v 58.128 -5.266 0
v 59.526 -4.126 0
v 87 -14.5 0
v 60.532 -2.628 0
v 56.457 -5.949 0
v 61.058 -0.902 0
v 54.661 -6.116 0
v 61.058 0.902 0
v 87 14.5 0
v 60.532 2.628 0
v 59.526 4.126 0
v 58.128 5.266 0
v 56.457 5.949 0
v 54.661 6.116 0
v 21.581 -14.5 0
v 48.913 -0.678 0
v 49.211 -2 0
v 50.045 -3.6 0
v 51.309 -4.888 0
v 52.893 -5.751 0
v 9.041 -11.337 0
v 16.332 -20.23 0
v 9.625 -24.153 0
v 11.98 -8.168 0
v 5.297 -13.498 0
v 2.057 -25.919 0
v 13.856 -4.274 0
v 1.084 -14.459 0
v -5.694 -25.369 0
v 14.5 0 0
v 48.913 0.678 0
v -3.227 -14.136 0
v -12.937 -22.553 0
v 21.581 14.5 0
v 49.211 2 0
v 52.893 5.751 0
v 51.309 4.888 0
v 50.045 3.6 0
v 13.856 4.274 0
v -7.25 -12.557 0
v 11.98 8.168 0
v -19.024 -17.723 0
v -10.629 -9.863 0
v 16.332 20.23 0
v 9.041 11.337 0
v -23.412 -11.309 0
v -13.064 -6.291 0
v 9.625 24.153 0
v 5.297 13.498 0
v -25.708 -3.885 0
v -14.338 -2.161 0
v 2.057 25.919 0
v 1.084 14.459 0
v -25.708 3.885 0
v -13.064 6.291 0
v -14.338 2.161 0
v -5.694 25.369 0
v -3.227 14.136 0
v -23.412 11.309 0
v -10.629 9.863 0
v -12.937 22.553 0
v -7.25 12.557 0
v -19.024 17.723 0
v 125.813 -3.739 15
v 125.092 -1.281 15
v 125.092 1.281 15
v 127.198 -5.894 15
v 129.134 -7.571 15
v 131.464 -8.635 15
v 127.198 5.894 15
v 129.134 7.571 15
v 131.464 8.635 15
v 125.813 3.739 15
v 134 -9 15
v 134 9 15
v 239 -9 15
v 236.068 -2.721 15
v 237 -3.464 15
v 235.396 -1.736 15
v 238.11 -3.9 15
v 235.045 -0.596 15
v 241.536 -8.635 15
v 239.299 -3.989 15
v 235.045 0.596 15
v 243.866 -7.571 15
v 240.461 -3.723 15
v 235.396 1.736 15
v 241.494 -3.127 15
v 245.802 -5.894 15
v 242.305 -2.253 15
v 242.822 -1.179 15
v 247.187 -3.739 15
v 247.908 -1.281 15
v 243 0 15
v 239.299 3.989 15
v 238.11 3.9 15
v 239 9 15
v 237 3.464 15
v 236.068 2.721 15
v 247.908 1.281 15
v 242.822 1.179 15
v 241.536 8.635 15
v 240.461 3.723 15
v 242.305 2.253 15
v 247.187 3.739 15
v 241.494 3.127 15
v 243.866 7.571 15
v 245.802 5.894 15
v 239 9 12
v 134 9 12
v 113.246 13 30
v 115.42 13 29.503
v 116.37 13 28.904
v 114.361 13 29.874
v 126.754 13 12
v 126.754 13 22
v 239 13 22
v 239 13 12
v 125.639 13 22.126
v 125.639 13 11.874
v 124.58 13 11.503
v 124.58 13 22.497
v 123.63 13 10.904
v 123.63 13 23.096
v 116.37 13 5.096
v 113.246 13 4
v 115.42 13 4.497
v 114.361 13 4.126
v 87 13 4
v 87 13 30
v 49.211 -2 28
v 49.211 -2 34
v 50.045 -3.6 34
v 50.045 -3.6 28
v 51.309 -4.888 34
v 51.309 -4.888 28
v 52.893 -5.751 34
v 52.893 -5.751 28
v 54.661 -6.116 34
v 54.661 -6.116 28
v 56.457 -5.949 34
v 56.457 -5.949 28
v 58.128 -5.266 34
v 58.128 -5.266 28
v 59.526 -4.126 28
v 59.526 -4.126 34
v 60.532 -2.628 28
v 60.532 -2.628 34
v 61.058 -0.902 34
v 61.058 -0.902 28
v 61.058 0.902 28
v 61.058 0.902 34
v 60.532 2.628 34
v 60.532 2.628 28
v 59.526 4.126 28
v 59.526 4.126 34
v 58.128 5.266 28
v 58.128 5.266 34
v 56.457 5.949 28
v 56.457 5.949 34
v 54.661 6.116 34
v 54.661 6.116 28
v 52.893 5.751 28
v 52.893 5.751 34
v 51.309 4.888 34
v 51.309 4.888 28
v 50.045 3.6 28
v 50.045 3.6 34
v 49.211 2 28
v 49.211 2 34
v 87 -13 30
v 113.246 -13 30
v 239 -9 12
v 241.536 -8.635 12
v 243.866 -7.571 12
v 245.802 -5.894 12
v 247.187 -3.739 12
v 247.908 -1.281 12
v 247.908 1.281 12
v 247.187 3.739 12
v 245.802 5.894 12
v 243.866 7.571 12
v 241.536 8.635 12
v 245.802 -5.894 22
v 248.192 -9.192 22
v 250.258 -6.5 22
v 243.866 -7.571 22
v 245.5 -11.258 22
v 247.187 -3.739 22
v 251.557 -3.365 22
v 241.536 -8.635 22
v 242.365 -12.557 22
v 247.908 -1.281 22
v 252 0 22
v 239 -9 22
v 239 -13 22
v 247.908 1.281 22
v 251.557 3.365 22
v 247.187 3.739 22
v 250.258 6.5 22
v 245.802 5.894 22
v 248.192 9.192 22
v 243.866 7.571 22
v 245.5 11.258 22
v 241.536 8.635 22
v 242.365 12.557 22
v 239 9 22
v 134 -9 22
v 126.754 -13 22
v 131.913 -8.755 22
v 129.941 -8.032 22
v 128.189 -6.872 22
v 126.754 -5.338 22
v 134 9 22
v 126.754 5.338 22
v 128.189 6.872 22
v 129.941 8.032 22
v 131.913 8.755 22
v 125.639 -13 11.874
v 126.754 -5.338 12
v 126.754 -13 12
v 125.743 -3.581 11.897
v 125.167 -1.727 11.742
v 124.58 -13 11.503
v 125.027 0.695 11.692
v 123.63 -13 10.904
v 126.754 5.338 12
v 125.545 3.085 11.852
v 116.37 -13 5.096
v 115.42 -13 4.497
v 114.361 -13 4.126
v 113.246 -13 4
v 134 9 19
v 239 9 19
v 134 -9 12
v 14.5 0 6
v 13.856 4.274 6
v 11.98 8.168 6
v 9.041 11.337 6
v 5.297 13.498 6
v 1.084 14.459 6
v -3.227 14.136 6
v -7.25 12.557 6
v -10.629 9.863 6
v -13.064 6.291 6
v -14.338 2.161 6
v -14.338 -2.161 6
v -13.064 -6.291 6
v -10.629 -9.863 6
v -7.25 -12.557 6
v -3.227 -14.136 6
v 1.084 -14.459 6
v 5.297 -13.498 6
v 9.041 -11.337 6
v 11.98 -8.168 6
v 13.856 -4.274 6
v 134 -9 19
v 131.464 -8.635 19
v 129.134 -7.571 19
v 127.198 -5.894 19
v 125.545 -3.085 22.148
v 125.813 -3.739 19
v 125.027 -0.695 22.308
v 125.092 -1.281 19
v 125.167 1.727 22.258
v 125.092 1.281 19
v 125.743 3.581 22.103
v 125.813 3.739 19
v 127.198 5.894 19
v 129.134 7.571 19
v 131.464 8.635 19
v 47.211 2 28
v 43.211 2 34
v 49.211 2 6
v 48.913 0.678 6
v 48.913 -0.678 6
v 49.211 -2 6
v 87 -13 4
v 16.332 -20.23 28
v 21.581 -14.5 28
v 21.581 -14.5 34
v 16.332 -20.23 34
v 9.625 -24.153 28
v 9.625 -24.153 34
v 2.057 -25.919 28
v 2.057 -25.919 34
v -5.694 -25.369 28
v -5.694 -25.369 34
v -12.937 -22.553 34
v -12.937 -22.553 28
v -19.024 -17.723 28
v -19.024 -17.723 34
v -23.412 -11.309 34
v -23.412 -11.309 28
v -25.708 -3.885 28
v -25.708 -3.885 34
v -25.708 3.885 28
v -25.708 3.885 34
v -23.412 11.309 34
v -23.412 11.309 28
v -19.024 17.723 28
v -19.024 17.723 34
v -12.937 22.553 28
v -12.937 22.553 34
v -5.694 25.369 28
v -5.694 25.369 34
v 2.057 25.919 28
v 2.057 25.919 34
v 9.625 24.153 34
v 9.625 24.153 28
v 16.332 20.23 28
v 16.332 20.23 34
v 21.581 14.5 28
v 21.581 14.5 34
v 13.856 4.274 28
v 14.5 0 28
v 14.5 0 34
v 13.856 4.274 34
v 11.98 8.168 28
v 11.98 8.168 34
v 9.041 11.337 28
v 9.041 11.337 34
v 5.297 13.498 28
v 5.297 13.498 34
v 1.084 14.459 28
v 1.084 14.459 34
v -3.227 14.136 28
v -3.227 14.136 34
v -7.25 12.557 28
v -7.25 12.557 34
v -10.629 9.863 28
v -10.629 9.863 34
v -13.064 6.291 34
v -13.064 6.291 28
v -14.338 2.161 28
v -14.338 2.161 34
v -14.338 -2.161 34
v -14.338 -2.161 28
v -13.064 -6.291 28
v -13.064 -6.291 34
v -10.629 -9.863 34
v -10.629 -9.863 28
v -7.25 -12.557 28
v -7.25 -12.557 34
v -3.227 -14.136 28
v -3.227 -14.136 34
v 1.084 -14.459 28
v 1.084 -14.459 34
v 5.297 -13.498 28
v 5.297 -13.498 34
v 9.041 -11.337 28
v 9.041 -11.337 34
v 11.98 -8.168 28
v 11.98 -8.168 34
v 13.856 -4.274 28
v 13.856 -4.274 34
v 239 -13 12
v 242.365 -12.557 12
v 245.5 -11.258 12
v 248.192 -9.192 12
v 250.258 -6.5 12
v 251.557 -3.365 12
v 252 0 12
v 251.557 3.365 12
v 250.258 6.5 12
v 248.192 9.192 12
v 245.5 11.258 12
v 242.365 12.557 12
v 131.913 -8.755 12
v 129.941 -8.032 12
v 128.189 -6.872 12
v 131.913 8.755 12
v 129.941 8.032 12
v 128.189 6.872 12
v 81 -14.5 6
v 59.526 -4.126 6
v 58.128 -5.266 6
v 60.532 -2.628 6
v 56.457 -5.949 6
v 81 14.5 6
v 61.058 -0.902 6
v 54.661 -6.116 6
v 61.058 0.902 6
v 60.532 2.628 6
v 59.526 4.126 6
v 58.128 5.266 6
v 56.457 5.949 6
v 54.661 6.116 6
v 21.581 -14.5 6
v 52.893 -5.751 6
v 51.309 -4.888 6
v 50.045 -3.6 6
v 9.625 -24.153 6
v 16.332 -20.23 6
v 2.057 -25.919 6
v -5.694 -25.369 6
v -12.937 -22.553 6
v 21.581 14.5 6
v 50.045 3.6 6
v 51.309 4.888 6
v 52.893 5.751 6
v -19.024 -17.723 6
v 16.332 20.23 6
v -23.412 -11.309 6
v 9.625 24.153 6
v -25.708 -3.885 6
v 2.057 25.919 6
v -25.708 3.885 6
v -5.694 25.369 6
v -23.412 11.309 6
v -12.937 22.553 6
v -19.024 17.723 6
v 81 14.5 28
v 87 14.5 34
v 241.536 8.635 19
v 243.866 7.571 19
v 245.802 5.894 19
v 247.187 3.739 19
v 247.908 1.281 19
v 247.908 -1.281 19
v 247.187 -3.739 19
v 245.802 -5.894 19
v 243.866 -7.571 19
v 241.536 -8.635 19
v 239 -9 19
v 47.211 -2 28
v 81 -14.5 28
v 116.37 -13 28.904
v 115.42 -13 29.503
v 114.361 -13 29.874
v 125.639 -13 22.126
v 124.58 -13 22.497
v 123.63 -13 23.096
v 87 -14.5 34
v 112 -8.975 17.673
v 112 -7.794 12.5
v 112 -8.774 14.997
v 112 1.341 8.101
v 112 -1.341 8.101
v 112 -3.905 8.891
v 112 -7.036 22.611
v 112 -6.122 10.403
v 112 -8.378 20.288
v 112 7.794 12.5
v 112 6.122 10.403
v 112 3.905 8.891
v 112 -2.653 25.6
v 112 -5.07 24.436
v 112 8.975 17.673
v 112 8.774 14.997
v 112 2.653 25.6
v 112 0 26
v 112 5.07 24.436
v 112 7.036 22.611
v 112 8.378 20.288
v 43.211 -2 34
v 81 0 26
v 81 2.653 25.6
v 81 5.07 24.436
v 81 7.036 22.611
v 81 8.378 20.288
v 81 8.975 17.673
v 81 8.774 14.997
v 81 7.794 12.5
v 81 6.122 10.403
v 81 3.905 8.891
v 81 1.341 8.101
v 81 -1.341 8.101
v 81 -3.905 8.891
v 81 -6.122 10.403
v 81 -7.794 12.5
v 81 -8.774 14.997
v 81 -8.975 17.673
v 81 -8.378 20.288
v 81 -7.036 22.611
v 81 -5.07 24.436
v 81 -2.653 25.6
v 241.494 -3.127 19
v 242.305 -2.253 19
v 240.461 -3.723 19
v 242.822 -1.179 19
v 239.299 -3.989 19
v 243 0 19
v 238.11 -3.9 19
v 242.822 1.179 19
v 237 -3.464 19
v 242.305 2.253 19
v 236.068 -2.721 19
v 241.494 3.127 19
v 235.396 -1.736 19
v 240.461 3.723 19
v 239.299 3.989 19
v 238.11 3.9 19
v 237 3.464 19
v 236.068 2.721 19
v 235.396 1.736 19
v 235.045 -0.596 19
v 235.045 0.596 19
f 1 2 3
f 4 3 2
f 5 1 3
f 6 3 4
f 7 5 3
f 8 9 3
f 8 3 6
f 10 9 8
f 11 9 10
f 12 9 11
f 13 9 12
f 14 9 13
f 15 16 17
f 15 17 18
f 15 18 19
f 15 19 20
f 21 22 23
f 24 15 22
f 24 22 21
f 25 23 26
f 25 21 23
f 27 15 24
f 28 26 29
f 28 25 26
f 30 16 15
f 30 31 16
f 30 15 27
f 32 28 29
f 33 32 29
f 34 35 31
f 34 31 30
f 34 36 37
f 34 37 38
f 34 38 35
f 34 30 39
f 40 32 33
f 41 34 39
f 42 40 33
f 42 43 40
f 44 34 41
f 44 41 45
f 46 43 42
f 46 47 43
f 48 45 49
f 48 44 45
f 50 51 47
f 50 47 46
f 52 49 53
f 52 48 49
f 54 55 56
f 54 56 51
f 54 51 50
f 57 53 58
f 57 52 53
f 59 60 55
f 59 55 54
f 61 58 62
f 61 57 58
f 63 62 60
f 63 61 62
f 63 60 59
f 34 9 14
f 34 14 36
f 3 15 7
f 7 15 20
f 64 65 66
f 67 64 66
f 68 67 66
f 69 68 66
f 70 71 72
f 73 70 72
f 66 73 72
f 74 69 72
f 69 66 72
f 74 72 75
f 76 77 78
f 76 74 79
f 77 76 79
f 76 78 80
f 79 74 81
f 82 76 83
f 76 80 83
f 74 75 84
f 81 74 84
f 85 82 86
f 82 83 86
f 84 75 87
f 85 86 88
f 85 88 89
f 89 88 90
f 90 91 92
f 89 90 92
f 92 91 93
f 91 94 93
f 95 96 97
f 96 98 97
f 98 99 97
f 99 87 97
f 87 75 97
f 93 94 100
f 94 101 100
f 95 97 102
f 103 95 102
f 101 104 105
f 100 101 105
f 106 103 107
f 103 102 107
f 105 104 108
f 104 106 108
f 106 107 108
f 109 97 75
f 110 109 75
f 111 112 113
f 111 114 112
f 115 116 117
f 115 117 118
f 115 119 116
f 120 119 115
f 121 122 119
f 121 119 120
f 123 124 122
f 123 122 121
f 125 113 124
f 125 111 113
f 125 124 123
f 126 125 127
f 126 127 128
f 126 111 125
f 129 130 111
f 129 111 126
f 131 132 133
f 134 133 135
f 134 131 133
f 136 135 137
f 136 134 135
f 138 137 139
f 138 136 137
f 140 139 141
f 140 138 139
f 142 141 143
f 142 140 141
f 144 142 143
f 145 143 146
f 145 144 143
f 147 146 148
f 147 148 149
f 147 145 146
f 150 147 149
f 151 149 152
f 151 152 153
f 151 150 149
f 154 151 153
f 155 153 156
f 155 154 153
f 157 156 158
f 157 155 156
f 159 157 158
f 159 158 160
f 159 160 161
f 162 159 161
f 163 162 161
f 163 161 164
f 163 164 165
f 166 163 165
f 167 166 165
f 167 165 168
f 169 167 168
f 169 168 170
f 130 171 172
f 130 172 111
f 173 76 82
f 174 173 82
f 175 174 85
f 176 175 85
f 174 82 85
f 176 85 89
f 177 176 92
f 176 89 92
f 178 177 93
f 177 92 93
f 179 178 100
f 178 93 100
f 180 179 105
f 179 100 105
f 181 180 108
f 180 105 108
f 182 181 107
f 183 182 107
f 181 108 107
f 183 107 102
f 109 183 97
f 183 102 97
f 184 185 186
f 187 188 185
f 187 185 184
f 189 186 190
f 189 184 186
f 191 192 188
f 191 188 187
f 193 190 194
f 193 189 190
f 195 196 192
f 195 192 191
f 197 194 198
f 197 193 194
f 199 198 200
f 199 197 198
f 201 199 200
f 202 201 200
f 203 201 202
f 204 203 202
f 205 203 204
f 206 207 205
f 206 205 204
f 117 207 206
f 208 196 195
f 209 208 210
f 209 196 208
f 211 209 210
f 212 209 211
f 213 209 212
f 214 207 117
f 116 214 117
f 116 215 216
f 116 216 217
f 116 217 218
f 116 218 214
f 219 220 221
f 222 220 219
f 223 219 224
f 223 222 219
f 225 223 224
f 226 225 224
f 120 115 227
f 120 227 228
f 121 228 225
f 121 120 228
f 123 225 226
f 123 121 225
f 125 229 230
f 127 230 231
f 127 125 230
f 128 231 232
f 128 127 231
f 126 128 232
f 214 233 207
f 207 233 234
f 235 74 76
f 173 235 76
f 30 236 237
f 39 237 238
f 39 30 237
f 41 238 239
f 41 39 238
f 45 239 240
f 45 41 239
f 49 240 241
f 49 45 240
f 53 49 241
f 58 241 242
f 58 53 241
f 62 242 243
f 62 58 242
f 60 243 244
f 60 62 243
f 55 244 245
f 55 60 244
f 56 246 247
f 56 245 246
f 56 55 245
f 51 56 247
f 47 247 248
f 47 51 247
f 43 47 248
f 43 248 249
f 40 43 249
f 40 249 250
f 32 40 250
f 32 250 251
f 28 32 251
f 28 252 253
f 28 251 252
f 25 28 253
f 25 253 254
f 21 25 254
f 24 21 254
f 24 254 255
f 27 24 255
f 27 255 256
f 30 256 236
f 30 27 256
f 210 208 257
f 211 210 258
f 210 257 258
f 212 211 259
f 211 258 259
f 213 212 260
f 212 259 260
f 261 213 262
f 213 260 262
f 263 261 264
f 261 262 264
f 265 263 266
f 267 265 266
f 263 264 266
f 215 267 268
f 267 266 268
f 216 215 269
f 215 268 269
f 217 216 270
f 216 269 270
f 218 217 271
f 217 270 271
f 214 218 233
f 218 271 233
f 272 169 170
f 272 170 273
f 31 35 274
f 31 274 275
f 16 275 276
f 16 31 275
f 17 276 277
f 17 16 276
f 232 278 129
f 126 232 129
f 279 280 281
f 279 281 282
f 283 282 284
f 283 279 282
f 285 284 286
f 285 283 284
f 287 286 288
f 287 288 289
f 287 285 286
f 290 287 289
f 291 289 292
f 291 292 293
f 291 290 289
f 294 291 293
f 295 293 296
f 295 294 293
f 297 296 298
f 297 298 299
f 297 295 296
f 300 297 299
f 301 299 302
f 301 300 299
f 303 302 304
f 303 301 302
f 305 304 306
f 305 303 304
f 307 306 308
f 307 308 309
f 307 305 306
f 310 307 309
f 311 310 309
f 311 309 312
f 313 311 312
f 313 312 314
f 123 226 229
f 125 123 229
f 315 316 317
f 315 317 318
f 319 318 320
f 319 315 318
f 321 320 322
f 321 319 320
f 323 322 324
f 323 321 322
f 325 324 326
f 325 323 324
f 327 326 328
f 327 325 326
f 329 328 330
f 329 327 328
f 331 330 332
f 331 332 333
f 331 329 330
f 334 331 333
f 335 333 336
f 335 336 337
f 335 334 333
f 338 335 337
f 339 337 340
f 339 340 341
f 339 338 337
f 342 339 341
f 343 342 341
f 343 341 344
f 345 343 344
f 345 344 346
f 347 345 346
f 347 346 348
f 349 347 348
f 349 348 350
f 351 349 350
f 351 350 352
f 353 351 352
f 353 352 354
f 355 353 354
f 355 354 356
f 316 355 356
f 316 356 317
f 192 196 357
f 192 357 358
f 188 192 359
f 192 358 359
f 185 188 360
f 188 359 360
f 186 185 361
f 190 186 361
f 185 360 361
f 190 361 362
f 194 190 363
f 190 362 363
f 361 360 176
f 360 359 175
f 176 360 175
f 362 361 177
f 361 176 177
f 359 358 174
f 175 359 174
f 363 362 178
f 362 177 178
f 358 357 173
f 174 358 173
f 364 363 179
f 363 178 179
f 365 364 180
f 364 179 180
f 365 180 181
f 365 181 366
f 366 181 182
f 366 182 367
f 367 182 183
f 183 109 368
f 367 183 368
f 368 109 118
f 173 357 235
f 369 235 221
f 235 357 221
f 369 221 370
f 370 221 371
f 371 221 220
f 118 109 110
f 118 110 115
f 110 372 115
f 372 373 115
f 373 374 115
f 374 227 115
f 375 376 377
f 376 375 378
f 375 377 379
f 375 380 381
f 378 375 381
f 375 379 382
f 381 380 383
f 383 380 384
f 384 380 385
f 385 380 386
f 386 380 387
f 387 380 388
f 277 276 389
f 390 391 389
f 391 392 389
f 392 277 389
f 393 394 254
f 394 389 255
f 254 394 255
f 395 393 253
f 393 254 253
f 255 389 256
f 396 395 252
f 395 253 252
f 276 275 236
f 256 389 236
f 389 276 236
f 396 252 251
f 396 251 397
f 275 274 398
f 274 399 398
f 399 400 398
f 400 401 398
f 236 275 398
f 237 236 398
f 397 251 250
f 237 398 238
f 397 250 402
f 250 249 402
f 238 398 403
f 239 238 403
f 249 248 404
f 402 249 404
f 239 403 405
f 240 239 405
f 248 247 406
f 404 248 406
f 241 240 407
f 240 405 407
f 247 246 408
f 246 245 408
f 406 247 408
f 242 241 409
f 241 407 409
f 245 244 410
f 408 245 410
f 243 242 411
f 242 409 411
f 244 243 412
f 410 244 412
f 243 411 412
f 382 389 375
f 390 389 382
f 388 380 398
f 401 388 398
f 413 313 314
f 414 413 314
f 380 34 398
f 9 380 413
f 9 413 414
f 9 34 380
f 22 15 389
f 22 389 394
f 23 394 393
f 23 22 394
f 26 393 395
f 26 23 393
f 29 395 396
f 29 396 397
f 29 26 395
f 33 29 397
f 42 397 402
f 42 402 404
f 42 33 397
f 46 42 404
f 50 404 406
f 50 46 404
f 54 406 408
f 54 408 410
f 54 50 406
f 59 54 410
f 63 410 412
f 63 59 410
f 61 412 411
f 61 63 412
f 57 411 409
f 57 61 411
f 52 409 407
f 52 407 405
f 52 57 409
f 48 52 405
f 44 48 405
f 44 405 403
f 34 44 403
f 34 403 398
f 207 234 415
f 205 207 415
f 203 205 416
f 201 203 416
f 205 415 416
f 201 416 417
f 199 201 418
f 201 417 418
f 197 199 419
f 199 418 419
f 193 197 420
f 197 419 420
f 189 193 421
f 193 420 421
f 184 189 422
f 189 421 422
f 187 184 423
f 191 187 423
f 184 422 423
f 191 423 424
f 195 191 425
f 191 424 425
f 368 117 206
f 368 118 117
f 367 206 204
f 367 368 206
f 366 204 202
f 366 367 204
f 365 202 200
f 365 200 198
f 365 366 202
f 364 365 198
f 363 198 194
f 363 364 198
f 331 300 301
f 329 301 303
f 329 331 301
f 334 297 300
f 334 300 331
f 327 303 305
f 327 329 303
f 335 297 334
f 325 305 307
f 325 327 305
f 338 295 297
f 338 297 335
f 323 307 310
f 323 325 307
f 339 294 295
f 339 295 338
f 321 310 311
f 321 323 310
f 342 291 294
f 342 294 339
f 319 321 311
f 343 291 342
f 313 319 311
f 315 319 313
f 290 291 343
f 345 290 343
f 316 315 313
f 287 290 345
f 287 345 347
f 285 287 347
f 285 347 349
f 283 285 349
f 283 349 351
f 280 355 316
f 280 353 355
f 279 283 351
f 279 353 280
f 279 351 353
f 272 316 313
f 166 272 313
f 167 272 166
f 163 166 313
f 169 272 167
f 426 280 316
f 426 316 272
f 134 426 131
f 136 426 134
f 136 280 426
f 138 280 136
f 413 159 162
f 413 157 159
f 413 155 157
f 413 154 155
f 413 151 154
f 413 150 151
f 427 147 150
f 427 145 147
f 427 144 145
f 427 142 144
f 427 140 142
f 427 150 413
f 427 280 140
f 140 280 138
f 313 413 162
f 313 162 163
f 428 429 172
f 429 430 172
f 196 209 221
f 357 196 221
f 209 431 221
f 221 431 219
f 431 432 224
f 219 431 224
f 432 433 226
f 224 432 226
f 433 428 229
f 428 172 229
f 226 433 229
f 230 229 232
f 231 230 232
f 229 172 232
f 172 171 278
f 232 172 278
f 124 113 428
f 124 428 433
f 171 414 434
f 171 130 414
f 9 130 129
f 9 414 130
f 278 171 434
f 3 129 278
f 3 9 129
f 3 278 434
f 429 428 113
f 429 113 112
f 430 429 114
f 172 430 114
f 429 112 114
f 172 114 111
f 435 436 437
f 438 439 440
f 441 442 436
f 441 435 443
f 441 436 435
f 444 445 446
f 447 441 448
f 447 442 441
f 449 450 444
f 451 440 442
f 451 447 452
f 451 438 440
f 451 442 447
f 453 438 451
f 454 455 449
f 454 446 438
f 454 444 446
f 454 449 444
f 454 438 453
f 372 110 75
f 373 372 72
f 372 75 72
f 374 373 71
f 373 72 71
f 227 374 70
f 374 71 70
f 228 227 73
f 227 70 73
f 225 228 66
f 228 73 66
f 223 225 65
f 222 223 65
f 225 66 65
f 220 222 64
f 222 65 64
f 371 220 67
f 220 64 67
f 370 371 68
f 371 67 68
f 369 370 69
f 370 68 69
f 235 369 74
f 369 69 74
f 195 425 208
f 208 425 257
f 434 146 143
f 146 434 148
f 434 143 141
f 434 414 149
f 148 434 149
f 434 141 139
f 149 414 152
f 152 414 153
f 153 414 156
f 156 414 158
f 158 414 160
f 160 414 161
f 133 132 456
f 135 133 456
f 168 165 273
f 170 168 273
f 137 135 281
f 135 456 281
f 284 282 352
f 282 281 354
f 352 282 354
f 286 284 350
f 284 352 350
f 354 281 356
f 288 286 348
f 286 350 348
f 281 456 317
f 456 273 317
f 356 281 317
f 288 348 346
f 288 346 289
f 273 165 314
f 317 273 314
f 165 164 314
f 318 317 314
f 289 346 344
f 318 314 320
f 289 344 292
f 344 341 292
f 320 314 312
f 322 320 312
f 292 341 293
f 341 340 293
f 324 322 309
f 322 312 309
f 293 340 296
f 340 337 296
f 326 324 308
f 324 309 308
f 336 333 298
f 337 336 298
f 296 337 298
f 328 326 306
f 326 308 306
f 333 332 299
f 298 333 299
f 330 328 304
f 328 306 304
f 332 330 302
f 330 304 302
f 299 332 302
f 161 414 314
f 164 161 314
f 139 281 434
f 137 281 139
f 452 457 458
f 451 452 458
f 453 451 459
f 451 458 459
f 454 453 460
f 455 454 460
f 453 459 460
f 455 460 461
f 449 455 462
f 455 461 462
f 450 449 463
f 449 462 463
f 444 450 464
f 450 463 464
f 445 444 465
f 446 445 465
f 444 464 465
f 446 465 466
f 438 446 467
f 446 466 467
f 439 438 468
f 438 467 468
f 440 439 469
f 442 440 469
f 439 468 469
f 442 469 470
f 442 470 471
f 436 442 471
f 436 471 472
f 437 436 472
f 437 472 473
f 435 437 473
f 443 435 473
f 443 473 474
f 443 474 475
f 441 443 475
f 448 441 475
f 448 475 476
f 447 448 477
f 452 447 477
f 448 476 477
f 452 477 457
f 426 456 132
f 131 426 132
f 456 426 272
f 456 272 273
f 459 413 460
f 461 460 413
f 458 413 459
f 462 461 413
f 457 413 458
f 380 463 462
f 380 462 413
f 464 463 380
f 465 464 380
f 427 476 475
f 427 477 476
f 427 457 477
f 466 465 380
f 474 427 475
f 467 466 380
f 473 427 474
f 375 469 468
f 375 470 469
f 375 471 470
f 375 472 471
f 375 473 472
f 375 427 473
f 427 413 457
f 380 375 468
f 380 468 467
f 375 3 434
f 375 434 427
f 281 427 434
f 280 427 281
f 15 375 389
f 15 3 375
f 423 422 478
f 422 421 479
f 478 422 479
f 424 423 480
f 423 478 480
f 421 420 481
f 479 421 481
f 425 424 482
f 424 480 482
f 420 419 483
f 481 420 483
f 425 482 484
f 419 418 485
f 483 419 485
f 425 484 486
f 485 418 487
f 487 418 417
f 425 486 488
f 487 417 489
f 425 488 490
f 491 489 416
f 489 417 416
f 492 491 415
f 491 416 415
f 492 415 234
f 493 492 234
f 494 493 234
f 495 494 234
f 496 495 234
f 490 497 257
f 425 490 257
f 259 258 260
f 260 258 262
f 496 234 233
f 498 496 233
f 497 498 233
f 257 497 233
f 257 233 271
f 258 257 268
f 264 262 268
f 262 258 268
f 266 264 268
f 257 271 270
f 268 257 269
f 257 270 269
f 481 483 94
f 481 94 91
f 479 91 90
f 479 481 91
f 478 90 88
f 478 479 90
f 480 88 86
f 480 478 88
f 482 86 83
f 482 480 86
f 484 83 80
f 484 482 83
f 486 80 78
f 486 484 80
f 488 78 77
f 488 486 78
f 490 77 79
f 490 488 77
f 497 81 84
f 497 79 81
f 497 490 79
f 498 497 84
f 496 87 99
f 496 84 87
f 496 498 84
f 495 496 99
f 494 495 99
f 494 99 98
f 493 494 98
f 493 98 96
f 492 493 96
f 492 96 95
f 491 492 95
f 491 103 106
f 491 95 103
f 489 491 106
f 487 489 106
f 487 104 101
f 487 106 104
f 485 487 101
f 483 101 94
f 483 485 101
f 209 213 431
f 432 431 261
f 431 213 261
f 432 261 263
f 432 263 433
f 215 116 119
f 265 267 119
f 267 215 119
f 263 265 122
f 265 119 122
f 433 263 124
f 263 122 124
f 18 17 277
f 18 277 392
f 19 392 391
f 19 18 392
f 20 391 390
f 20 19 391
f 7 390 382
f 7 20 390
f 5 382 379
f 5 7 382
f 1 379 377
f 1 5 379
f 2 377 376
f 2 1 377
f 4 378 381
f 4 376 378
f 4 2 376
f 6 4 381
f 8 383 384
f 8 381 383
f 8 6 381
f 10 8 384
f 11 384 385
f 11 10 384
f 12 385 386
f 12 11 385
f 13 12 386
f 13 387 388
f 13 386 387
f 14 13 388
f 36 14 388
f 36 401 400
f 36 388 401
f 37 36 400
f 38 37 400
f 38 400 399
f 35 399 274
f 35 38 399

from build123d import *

# Parameters (mm, degrees)
ESBO_O1_R                  = 14.5
RESSALTO_EXTRUS_O1_DEPTH   = 34
CORTE_EXTRUS_O1_DEPTH      = 36
CORTE_EXTRUS_O1_DEPTH_BACK = 56
ESBO_O2_W                  = 115.279866195
ESBO_O2_H                  = 22
RESSALTO_EXTRUS_O2_DEPTH   = 4
RESSALTO_EXTRUS_O3_START   = -6
RESSALTO_EXTRUS_O3_DEPTH   = 6
ESBO_O5_W                  = 26
ESBO_O5_H                  = 26
RESSALTO_EXTRUS_O4_DEPTH   = 28
ESBO_O6_R                  = 9
CORTE_EXTRUS_O2_DEPTH      = 31
ESBO_O7_W                  = 10
ESBO_O7_H                  = 26
RESSALTO_EXTRUS_O5_DEPTH   = 10
RESSALTO_EXTRUS_O7_START   = -26
RESSALTO_EXTRUS_O7_DEPTH   = 26
FILETE1_R                  = 5
ESBO_O9_W                  = 10
ESBO_O9_H                  = 26
RESSALTO_EXTRUS_O8_DEPTH   = 127
FILETE2_R                  = 13
FILETE3_R                  = 5
CORTE_EXTRUS_O3_DEPTH      = 49
CORTE_EXTRUS_O3_DEPTH_BACK = 3
CORTE_EXTRUS_O4_DEPTH      = 52
CORTE_EXTRUS_O4_DEPTH_BACK = 3
CORTE_EXTRUS_O5_DEPTH      = 27
CORTE_EXTRUS_O5_DEPTH_BACK = 22
ESBO_O12_R                 = 4


with BuildPart() as part:
    # Esboço1 → Ressalto-extrusão1 (new body)
    with BuildSketch(Plane.XY):
        with BuildLine():
            Line((21.581241855, 14.5), (87, 14.5))
            Line((87, 14.5), (87, -14.5))
            Line((87, -14.5), (21.581241855, -14.5))
            ThreePointArc((21.581241855, -14.5), (-26, 0), (21.581241855, 14.5))
        make_face()
        Circle(ESBO_O1_R, mode=Mode.SUBTRACT)
        with BuildLine():
            ThreePointArc((49.210731912, -2), (61.125, 0), (49.210731912, 2))
            Line((49.210731912, 2), (43.210731912, 2))
            Line((43.210731912, 2), (43.210731912, -2))
            Line((43.210731912, -2), (49.210731912, -2))
        make_face(mode=Mode.SUBTRACT)
    extrude(amount=RESSALTO_EXTRUS_O1_DEPTH)

    # Esboço2 → Corte-extrusão1 (cut, two sides: drawn at the far end of the back side and taken through both)
    with BuildSketch(Plane(origin=(0, 14.5, 0), x_dir=(1, 0, 0), z_dir=(0, 1, 0)).offset(-CORTE_EXTRUS_O1_DEPTH_BACK)):
        with Locations((23.360066902, -17)):
            Rectangle(ESBO_O2_W, ESBO_O2_H)
    extrude(amount=CORTE_EXTRUS_O1_DEPTH + CORTE_EXTRUS_O1_DEPTH_BACK, mode=Mode.SUBTRACT)

    # Esboço3 → Ressalto-extrusão2 (add)
    with BuildSketch(Plane(origin=(0, -2, 0), x_dir=(1, 0, 0), z_dir=(0, 1, 0))):
        Polygon((43.210731912, -28), (47.210731912, -28), (43.210731912, -34), align=None)
    extrude(amount=RESSALTO_EXTRUS_O2_DEPTH)

    # Esboço4 → Ressalto-extrusão3 (add)
    with BuildSketch(Plane.XY.offset(6).offset(RESSALTO_EXTRUS_O3_START)):
        with BuildLine():
            ThreePointArc((49.210731912, 2), (48.875, 0), (49.210731912, -2))
            Line((49.210731912, -2), (43.210731912, -2))
            Line((43.210731912, -2), (43.210731912, 2))
            Line((43.210731912, 2), (49.210731912, 2))
        make_face()
    extrude(amount=RESSALTO_EXTRUS_O3_DEPTH)

    # Esboço5 → Ressalto-extrusão4 (add)
    with BuildSketch(Plane(origin=(87, 0, 0), x_dir=(0, 0, -1), z_dir=(1, 0, 0))):
        with Locations((-17, 0)):
            Rectangle(ESBO_O5_W, ESBO_O5_H)
    extrude(amount=RESSALTO_EXTRUS_O4_DEPTH)

    # Esboço6 → Corte-extrusão2 (cut)
    with BuildSketch(Plane.ZY.offset(-81)):
        with Locations((17, 0)):
            Circle(ESBO_O6_R)
    extrude(amount=-CORTE_EXTRUS_O2_DEPTH, mode=Mode.SUBTRACT)

    # Esboço7 → Ressalto-extrusão5 (add)
    with BuildSketch(Plane(origin=(115, 0, 0), x_dir=(0, 0, -1), z_dir=(1, 0, 0))):
        with Locations((-17, 0)):
            Rectangle(ESBO_O7_W, ESBO_O7_H)
    extrude(amount=RESSALTO_EXTRUS_O5_DEPTH)

    # Esboço8 → Ressalto-extrusão7 (add)
    with BuildSketch(Plane(origin=(0, 13, 0), x_dir=(1, 0, 0), z_dir=(0, 1, 0)).offset(RESSALTO_EXTRUS_O7_START)):
        Polygon((125, -12), (115, -4), (115, -12), align=None)
        Polygon((125, -22), (115, -22), (115, -30), align=None)
    extrude(amount=RESSALTO_EXTRUS_O7_DEPTH)

    # Filete1
    filete1_edges = [part.edges().sort_by_distance(p)[0] for p in [
        (115, 0, 30),
        (115, 0, 4),
    ]]
    fillet(filete1_edges, radius=FILETE1_R)

    # Esboço9 → Ressalto-extrusão8 (add)
    with BuildSketch(Plane(origin=(125, 0, 0), x_dir=(0, 0, -1), z_dir=(1, 0, 0))):
        with Locations((-17, 0)):
            Rectangle(ESBO_O9_W, ESBO_O9_H)
    extrude(amount=RESSALTO_EXTRUS_O8_DEPTH)

    # Filete2
    filete2_edges = [part.edges().sort_by_distance(p)[0] for p in [
        (252, -13, 17),
        (252, 13, 17),
    ]]
    fillet(filete2_edges, radius=FILETE2_R - 0.0001)  # a hair under: the kernel refuses the full size

    # Filete3
    filete3_edges = [part.edges().sort_by_distance(p)[0] for p in [
        (125, 0, 22),
        (125, 0, 12),
    ]]
    fillet(filete3_edges, radius=FILETE3_R)

    # Esboço10 → Corte-extrusão3 (cut, two sides: drawn at the far end of the back side and taken through both)
    with BuildSketch(Plane.XY.offset(22).offset(-CORTE_EXTRUS_O3_DEPTH_BACK)):
        with BuildLine():
            Line((134, 9), (239, 9))
            ThreePointArc((239, 9), (248, 0), (239, -9))
            Line((239, -9), (134, -9))
            ThreePointArc((134, -9), (125, 0), (134, 9))
        make_face()
    extrude(amount=CORTE_EXTRUS_O3_DEPTH + CORTE_EXTRUS_O3_DEPTH_BACK, mode=Mode.SUBTRACT)

    # Esboço11 → Corte-extrusão4 (cut, two sides: drawn at the far end of the back side and taken through both)
    with BuildSketch(Plane(origin=(0, 0, 12), x_dir=(-1, 0, 0), z_dir=(0, 0, -1)).offset(-CORTE_EXTRUS_O4_DEPTH_BACK)):
        with BuildLine():
            Line((-239, 9), (-134, 9))
            ThreePointArc((-134, 9), (-125, 0), (-134, -9))
            Line((-134, -9), (-239, -9))
            ThreePointArc((-239, -9), (-248, 0), (-239, 9))
        make_face()
    extrude(amount=CORTE_EXTRUS_O4_DEPTH + CORTE_EXTRUS_O4_DEPTH_BACK, mode=Mode.SUBTRACT)

    # Esboço12 → Corte-extrusão5 (cut, two sides: drawn at the far end of the back side and taken through both)
    with BuildSketch(Plane(origin=(0, 0, 15), x_dir=(-1, 0, 0), z_dir=(0, 0, -1)).offset(-CORTE_EXTRUS_O5_DEPTH_BACK)):
        with Locations(Location((-239, 0, 0), (0, 0, 180))):
            Circle(ESBO_O12_R)
    extrude(amount=CORTE_EXTRUS_O5_DEPTH + CORTE_EXTRUS_O5_DEPTH_BACK, mode=Mode.SUBTRACT)


solid = part.part
